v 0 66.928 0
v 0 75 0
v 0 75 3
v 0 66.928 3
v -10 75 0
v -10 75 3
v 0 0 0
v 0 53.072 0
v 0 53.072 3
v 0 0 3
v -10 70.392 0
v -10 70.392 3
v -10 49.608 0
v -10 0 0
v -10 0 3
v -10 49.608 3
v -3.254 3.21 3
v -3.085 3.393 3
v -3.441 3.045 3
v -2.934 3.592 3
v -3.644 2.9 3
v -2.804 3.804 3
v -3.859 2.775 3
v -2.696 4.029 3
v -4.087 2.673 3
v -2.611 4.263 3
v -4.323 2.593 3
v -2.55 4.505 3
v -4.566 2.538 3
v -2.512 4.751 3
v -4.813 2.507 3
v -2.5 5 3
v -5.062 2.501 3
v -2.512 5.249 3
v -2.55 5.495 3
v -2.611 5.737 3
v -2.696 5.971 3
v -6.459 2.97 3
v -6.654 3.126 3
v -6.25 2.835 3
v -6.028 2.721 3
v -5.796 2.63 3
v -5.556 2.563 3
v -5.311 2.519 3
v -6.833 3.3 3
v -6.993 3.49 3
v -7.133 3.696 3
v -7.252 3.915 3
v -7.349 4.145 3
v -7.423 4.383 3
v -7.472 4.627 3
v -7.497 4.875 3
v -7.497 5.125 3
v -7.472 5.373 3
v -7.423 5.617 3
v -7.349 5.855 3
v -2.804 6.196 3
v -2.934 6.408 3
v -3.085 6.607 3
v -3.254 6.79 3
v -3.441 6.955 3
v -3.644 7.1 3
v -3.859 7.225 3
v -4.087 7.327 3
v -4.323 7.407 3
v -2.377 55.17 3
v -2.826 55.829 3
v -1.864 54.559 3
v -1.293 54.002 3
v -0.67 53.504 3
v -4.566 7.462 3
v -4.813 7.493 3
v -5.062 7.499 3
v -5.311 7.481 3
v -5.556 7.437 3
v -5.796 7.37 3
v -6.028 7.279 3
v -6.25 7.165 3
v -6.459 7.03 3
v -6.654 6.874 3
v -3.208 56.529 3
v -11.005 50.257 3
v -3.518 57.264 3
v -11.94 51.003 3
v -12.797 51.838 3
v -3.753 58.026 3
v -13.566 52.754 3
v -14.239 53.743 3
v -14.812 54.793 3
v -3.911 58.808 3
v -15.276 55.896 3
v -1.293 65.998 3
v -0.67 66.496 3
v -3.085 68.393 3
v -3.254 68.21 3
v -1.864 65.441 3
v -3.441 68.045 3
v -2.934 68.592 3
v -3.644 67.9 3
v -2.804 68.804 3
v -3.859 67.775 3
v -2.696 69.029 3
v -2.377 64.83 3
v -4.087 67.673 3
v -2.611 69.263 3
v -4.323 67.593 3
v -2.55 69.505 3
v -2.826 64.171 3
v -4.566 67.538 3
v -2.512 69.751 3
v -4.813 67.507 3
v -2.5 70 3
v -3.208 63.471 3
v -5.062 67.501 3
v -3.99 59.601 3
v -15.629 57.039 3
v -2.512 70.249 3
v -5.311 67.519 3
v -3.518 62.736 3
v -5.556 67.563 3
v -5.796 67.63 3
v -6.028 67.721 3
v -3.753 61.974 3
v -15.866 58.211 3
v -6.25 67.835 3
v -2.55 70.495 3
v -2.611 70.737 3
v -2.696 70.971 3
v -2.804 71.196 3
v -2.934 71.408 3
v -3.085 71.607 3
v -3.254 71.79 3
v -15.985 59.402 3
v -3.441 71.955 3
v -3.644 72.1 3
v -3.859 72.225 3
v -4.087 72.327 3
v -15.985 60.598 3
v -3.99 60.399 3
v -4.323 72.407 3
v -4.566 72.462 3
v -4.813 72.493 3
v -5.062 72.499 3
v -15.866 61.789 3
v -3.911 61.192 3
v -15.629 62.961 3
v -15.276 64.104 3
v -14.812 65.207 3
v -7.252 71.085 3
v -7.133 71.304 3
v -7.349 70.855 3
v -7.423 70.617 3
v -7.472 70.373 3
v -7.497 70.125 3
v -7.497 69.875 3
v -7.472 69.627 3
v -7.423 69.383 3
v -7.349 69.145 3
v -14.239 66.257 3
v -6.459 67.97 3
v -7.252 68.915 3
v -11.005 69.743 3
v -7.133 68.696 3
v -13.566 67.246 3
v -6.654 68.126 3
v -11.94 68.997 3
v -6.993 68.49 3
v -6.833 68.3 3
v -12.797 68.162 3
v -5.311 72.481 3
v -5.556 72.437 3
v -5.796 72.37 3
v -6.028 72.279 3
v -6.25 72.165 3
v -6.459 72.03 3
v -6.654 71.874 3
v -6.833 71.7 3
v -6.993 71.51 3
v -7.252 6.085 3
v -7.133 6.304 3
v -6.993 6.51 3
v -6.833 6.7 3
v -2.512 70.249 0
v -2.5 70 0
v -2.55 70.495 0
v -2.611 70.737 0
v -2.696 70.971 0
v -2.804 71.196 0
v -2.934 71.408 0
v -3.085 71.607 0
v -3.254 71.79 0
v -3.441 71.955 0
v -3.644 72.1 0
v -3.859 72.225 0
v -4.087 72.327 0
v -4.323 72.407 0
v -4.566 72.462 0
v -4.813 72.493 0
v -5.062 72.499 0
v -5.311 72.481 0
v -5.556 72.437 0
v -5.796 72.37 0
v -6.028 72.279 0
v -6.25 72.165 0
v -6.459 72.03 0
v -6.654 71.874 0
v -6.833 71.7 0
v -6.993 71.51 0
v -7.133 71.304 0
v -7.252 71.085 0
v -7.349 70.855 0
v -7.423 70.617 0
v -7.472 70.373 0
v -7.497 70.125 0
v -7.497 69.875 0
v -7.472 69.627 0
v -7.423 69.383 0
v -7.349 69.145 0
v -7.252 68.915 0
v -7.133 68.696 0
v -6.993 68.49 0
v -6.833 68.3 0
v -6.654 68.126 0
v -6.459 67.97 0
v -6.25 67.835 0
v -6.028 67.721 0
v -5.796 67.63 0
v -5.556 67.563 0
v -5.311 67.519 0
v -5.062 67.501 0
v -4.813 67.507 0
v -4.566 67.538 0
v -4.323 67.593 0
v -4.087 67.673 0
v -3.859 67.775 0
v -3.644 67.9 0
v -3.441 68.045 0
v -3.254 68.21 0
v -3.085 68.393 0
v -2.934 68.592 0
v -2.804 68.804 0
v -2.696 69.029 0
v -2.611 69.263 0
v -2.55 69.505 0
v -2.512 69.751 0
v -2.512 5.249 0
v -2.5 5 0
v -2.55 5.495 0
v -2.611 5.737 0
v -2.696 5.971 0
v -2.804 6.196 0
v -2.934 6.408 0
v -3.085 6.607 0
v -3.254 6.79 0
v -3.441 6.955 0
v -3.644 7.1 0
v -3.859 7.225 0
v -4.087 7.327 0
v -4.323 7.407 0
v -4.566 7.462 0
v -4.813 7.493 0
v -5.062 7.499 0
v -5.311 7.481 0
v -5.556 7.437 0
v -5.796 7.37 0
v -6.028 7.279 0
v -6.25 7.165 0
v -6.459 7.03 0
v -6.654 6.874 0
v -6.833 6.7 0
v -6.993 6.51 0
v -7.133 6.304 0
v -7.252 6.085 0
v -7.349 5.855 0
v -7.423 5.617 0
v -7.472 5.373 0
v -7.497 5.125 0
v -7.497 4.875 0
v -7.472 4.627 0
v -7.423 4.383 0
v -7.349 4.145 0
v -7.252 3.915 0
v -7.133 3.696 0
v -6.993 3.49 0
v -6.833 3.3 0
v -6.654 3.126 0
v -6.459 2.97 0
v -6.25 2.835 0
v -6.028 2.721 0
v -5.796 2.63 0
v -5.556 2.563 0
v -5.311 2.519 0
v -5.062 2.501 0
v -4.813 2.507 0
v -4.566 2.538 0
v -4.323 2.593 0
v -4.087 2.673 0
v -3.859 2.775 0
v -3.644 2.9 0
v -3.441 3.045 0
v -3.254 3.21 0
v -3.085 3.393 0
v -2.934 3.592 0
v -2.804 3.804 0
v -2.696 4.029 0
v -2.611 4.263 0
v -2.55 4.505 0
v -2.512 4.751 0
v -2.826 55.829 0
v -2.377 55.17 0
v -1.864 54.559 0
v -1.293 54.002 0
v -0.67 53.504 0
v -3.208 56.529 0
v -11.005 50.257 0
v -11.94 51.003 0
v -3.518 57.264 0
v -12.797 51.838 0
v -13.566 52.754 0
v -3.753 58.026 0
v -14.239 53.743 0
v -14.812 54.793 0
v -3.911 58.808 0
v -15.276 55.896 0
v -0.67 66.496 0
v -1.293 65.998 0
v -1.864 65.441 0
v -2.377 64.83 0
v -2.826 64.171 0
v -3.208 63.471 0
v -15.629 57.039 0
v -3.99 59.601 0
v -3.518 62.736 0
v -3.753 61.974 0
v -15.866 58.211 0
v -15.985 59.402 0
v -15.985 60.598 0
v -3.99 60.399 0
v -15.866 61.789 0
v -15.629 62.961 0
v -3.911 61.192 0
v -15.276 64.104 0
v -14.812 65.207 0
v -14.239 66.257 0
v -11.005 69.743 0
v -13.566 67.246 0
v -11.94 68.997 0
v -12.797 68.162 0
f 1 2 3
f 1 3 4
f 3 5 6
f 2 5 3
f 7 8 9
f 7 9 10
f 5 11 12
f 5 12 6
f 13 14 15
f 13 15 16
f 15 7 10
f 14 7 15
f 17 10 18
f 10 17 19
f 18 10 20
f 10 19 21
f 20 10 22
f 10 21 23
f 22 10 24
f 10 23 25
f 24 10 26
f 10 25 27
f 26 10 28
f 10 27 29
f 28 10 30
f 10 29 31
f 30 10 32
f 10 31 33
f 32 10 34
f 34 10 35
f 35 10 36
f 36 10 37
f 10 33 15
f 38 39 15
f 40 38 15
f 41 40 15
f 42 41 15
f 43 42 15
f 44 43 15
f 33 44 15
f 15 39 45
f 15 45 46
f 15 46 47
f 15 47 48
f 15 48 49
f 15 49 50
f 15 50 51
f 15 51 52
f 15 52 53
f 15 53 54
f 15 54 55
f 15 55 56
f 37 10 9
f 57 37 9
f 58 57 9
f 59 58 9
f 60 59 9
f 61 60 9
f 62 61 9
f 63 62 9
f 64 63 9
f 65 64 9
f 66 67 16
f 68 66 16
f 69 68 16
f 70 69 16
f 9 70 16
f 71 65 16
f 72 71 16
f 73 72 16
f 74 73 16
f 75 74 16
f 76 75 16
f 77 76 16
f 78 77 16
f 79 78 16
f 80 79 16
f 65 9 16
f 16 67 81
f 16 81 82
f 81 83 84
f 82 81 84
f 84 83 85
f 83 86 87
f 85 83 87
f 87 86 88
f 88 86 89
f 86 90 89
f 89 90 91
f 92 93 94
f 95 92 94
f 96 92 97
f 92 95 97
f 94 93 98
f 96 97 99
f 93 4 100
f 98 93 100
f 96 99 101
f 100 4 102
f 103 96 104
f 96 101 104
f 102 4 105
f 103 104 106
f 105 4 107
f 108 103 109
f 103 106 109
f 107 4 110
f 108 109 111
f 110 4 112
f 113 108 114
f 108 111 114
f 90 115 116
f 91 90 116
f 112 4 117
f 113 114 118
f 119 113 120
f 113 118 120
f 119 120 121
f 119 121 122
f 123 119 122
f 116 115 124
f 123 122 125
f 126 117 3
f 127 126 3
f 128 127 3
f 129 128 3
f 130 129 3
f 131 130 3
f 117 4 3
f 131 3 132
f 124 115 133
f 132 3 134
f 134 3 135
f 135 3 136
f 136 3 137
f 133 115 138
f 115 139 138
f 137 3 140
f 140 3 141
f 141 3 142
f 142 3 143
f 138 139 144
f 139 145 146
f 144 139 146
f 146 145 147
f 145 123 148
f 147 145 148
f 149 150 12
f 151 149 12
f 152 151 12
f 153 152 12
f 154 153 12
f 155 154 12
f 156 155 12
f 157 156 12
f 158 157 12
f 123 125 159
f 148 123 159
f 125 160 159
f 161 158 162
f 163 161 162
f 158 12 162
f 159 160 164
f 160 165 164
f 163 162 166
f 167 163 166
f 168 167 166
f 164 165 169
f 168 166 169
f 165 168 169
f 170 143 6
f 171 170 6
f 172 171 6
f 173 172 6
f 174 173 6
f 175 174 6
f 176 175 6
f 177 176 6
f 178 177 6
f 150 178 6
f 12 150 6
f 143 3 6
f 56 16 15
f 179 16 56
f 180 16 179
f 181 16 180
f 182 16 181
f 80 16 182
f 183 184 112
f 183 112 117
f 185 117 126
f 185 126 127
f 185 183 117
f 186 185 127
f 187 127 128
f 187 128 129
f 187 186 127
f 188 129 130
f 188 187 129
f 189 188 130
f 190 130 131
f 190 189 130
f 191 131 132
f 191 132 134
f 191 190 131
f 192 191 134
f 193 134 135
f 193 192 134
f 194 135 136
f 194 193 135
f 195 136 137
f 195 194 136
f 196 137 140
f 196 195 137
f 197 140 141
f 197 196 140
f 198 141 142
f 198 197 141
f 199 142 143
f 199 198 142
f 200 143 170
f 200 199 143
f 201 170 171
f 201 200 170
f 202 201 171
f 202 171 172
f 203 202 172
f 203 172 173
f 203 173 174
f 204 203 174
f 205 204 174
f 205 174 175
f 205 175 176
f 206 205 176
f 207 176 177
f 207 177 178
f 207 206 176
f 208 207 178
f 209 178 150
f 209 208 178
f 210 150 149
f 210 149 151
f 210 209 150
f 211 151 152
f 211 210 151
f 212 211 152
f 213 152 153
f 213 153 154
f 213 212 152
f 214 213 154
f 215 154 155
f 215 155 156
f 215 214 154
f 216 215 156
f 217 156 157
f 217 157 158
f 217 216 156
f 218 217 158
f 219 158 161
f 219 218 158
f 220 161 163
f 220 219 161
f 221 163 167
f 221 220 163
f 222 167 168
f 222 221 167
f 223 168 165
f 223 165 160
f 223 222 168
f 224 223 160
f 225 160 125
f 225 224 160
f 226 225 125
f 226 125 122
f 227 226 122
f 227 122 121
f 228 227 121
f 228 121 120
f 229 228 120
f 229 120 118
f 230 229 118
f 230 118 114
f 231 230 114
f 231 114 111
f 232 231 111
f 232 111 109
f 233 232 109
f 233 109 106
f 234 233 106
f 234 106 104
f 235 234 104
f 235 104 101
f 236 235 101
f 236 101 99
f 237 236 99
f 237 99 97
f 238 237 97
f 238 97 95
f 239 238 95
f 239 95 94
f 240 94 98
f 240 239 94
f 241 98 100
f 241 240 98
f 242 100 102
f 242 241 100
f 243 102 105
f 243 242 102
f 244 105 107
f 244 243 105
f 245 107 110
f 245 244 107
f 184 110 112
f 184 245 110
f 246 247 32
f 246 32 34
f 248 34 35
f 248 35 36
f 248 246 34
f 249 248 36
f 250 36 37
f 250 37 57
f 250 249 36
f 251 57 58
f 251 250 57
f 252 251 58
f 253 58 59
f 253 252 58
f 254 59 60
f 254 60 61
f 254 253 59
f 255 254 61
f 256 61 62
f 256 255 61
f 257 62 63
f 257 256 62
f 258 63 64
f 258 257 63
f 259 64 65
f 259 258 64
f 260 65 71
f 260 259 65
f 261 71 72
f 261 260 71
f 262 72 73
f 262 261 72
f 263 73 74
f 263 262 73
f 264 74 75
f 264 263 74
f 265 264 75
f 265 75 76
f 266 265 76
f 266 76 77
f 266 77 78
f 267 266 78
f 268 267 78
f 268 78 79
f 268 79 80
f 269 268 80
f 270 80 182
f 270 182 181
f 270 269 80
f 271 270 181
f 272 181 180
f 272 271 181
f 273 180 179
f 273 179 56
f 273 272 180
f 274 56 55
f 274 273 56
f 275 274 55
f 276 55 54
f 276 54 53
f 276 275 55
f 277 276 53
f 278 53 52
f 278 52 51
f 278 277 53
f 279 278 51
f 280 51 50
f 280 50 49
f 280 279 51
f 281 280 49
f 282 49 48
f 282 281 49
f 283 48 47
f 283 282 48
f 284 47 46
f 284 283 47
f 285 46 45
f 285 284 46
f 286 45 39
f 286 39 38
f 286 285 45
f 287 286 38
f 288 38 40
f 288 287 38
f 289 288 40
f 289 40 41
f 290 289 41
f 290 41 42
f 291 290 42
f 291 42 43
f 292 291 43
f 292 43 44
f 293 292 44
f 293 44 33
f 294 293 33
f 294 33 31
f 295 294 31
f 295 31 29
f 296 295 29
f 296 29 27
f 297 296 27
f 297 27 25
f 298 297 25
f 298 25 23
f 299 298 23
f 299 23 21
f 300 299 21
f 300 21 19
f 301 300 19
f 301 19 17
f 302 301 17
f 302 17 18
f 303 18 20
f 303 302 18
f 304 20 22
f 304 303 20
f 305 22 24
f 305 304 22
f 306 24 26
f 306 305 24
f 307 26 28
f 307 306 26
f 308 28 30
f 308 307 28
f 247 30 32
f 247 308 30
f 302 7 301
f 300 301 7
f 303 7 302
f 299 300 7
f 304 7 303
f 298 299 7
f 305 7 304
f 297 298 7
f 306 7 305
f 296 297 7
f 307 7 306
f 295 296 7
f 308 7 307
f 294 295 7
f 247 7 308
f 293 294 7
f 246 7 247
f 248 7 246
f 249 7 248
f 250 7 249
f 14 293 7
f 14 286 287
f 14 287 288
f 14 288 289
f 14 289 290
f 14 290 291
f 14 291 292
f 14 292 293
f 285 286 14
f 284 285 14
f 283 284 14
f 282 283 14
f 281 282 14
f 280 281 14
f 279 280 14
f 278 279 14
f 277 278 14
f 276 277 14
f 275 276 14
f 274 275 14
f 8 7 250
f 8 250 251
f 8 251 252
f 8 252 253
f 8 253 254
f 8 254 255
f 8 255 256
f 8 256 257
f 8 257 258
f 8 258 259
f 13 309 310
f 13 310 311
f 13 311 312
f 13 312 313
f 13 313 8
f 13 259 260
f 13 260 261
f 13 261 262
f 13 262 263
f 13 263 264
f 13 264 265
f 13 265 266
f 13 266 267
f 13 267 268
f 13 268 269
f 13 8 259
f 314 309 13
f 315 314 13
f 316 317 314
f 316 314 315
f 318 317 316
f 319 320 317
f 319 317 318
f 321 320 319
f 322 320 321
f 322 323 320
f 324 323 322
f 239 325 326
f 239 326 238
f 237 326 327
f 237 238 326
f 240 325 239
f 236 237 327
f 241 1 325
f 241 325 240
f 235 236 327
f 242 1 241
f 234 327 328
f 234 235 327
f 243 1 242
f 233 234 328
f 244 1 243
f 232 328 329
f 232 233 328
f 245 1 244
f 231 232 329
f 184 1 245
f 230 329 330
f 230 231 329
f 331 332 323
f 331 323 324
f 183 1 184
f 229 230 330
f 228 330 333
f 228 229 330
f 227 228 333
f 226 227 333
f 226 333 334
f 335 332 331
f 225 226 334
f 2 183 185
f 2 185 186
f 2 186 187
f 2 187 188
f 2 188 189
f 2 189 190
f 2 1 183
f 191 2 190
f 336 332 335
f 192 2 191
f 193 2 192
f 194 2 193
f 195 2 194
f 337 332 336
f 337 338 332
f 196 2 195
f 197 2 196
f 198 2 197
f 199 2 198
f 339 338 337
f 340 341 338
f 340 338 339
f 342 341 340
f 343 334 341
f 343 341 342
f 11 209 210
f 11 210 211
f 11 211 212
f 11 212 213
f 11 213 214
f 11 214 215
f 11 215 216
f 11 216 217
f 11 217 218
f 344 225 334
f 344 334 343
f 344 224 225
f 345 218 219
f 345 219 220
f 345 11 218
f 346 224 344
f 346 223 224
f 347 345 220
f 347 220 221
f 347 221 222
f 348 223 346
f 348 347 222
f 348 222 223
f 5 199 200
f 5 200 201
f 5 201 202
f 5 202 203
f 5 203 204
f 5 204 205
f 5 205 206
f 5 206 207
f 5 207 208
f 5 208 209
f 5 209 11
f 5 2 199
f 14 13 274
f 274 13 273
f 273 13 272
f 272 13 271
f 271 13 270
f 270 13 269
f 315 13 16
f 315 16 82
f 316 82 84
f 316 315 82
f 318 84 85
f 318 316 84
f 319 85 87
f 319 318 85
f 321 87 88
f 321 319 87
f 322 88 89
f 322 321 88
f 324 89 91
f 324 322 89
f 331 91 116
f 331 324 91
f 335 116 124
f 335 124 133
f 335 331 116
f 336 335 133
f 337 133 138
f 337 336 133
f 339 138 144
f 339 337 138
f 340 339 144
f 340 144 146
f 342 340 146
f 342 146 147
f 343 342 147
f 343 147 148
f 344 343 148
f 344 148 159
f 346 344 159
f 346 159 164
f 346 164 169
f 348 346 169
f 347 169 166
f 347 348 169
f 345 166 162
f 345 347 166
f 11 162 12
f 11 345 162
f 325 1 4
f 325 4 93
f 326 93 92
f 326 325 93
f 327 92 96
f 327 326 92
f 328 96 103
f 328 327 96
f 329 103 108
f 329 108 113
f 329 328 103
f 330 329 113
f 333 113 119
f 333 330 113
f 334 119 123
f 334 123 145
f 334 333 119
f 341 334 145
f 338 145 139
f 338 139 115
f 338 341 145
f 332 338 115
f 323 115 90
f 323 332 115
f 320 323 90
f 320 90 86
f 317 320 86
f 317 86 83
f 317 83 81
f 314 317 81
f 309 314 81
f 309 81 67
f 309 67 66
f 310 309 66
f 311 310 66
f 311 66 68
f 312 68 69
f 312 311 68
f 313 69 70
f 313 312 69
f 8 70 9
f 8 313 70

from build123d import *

# Parameters (mm, degrees)
SCHIZZO1_R                   = 2.5
ESTRUSIONE_ESTRUSIONE3_DEPTH = 3


with BuildPart() as part:
    # Schizzo1 → Estrusione-Estrusione3 (new body)
    with BuildSketch(Plane.XY):
        with BuildLine():
            Line((-10, 75), (0, 75))
            Line((0, 75), (0, 66.92820323))
            ThreePointArc((0, 66.92820323), (-4, 60), (0, 53.07179677))
            Line((0, 53.07179677), (0, 0))
            Line((0, 0), (-10, 0))
            Line((-10, 0), (-10, 49.607695155))
            ThreePointArc((-10, 49.607695155), (-16, 60), (-10, 70.392304845))
            Line((-10, 70.392304845), (-10, 75))
        make_face()
        with Locations((-5, 70)):
            Circle(SCHIZZO1_R, mode=Mode.SUBTRACT)
        with Locations((-5, 5)):
            Circle(SCHIZZO1_R, mode=Mode.SUBTRACT)
    extrude(amount=ESTRUSIONE_ESTRUSIONE3_DEPTH)


solid = part.part
